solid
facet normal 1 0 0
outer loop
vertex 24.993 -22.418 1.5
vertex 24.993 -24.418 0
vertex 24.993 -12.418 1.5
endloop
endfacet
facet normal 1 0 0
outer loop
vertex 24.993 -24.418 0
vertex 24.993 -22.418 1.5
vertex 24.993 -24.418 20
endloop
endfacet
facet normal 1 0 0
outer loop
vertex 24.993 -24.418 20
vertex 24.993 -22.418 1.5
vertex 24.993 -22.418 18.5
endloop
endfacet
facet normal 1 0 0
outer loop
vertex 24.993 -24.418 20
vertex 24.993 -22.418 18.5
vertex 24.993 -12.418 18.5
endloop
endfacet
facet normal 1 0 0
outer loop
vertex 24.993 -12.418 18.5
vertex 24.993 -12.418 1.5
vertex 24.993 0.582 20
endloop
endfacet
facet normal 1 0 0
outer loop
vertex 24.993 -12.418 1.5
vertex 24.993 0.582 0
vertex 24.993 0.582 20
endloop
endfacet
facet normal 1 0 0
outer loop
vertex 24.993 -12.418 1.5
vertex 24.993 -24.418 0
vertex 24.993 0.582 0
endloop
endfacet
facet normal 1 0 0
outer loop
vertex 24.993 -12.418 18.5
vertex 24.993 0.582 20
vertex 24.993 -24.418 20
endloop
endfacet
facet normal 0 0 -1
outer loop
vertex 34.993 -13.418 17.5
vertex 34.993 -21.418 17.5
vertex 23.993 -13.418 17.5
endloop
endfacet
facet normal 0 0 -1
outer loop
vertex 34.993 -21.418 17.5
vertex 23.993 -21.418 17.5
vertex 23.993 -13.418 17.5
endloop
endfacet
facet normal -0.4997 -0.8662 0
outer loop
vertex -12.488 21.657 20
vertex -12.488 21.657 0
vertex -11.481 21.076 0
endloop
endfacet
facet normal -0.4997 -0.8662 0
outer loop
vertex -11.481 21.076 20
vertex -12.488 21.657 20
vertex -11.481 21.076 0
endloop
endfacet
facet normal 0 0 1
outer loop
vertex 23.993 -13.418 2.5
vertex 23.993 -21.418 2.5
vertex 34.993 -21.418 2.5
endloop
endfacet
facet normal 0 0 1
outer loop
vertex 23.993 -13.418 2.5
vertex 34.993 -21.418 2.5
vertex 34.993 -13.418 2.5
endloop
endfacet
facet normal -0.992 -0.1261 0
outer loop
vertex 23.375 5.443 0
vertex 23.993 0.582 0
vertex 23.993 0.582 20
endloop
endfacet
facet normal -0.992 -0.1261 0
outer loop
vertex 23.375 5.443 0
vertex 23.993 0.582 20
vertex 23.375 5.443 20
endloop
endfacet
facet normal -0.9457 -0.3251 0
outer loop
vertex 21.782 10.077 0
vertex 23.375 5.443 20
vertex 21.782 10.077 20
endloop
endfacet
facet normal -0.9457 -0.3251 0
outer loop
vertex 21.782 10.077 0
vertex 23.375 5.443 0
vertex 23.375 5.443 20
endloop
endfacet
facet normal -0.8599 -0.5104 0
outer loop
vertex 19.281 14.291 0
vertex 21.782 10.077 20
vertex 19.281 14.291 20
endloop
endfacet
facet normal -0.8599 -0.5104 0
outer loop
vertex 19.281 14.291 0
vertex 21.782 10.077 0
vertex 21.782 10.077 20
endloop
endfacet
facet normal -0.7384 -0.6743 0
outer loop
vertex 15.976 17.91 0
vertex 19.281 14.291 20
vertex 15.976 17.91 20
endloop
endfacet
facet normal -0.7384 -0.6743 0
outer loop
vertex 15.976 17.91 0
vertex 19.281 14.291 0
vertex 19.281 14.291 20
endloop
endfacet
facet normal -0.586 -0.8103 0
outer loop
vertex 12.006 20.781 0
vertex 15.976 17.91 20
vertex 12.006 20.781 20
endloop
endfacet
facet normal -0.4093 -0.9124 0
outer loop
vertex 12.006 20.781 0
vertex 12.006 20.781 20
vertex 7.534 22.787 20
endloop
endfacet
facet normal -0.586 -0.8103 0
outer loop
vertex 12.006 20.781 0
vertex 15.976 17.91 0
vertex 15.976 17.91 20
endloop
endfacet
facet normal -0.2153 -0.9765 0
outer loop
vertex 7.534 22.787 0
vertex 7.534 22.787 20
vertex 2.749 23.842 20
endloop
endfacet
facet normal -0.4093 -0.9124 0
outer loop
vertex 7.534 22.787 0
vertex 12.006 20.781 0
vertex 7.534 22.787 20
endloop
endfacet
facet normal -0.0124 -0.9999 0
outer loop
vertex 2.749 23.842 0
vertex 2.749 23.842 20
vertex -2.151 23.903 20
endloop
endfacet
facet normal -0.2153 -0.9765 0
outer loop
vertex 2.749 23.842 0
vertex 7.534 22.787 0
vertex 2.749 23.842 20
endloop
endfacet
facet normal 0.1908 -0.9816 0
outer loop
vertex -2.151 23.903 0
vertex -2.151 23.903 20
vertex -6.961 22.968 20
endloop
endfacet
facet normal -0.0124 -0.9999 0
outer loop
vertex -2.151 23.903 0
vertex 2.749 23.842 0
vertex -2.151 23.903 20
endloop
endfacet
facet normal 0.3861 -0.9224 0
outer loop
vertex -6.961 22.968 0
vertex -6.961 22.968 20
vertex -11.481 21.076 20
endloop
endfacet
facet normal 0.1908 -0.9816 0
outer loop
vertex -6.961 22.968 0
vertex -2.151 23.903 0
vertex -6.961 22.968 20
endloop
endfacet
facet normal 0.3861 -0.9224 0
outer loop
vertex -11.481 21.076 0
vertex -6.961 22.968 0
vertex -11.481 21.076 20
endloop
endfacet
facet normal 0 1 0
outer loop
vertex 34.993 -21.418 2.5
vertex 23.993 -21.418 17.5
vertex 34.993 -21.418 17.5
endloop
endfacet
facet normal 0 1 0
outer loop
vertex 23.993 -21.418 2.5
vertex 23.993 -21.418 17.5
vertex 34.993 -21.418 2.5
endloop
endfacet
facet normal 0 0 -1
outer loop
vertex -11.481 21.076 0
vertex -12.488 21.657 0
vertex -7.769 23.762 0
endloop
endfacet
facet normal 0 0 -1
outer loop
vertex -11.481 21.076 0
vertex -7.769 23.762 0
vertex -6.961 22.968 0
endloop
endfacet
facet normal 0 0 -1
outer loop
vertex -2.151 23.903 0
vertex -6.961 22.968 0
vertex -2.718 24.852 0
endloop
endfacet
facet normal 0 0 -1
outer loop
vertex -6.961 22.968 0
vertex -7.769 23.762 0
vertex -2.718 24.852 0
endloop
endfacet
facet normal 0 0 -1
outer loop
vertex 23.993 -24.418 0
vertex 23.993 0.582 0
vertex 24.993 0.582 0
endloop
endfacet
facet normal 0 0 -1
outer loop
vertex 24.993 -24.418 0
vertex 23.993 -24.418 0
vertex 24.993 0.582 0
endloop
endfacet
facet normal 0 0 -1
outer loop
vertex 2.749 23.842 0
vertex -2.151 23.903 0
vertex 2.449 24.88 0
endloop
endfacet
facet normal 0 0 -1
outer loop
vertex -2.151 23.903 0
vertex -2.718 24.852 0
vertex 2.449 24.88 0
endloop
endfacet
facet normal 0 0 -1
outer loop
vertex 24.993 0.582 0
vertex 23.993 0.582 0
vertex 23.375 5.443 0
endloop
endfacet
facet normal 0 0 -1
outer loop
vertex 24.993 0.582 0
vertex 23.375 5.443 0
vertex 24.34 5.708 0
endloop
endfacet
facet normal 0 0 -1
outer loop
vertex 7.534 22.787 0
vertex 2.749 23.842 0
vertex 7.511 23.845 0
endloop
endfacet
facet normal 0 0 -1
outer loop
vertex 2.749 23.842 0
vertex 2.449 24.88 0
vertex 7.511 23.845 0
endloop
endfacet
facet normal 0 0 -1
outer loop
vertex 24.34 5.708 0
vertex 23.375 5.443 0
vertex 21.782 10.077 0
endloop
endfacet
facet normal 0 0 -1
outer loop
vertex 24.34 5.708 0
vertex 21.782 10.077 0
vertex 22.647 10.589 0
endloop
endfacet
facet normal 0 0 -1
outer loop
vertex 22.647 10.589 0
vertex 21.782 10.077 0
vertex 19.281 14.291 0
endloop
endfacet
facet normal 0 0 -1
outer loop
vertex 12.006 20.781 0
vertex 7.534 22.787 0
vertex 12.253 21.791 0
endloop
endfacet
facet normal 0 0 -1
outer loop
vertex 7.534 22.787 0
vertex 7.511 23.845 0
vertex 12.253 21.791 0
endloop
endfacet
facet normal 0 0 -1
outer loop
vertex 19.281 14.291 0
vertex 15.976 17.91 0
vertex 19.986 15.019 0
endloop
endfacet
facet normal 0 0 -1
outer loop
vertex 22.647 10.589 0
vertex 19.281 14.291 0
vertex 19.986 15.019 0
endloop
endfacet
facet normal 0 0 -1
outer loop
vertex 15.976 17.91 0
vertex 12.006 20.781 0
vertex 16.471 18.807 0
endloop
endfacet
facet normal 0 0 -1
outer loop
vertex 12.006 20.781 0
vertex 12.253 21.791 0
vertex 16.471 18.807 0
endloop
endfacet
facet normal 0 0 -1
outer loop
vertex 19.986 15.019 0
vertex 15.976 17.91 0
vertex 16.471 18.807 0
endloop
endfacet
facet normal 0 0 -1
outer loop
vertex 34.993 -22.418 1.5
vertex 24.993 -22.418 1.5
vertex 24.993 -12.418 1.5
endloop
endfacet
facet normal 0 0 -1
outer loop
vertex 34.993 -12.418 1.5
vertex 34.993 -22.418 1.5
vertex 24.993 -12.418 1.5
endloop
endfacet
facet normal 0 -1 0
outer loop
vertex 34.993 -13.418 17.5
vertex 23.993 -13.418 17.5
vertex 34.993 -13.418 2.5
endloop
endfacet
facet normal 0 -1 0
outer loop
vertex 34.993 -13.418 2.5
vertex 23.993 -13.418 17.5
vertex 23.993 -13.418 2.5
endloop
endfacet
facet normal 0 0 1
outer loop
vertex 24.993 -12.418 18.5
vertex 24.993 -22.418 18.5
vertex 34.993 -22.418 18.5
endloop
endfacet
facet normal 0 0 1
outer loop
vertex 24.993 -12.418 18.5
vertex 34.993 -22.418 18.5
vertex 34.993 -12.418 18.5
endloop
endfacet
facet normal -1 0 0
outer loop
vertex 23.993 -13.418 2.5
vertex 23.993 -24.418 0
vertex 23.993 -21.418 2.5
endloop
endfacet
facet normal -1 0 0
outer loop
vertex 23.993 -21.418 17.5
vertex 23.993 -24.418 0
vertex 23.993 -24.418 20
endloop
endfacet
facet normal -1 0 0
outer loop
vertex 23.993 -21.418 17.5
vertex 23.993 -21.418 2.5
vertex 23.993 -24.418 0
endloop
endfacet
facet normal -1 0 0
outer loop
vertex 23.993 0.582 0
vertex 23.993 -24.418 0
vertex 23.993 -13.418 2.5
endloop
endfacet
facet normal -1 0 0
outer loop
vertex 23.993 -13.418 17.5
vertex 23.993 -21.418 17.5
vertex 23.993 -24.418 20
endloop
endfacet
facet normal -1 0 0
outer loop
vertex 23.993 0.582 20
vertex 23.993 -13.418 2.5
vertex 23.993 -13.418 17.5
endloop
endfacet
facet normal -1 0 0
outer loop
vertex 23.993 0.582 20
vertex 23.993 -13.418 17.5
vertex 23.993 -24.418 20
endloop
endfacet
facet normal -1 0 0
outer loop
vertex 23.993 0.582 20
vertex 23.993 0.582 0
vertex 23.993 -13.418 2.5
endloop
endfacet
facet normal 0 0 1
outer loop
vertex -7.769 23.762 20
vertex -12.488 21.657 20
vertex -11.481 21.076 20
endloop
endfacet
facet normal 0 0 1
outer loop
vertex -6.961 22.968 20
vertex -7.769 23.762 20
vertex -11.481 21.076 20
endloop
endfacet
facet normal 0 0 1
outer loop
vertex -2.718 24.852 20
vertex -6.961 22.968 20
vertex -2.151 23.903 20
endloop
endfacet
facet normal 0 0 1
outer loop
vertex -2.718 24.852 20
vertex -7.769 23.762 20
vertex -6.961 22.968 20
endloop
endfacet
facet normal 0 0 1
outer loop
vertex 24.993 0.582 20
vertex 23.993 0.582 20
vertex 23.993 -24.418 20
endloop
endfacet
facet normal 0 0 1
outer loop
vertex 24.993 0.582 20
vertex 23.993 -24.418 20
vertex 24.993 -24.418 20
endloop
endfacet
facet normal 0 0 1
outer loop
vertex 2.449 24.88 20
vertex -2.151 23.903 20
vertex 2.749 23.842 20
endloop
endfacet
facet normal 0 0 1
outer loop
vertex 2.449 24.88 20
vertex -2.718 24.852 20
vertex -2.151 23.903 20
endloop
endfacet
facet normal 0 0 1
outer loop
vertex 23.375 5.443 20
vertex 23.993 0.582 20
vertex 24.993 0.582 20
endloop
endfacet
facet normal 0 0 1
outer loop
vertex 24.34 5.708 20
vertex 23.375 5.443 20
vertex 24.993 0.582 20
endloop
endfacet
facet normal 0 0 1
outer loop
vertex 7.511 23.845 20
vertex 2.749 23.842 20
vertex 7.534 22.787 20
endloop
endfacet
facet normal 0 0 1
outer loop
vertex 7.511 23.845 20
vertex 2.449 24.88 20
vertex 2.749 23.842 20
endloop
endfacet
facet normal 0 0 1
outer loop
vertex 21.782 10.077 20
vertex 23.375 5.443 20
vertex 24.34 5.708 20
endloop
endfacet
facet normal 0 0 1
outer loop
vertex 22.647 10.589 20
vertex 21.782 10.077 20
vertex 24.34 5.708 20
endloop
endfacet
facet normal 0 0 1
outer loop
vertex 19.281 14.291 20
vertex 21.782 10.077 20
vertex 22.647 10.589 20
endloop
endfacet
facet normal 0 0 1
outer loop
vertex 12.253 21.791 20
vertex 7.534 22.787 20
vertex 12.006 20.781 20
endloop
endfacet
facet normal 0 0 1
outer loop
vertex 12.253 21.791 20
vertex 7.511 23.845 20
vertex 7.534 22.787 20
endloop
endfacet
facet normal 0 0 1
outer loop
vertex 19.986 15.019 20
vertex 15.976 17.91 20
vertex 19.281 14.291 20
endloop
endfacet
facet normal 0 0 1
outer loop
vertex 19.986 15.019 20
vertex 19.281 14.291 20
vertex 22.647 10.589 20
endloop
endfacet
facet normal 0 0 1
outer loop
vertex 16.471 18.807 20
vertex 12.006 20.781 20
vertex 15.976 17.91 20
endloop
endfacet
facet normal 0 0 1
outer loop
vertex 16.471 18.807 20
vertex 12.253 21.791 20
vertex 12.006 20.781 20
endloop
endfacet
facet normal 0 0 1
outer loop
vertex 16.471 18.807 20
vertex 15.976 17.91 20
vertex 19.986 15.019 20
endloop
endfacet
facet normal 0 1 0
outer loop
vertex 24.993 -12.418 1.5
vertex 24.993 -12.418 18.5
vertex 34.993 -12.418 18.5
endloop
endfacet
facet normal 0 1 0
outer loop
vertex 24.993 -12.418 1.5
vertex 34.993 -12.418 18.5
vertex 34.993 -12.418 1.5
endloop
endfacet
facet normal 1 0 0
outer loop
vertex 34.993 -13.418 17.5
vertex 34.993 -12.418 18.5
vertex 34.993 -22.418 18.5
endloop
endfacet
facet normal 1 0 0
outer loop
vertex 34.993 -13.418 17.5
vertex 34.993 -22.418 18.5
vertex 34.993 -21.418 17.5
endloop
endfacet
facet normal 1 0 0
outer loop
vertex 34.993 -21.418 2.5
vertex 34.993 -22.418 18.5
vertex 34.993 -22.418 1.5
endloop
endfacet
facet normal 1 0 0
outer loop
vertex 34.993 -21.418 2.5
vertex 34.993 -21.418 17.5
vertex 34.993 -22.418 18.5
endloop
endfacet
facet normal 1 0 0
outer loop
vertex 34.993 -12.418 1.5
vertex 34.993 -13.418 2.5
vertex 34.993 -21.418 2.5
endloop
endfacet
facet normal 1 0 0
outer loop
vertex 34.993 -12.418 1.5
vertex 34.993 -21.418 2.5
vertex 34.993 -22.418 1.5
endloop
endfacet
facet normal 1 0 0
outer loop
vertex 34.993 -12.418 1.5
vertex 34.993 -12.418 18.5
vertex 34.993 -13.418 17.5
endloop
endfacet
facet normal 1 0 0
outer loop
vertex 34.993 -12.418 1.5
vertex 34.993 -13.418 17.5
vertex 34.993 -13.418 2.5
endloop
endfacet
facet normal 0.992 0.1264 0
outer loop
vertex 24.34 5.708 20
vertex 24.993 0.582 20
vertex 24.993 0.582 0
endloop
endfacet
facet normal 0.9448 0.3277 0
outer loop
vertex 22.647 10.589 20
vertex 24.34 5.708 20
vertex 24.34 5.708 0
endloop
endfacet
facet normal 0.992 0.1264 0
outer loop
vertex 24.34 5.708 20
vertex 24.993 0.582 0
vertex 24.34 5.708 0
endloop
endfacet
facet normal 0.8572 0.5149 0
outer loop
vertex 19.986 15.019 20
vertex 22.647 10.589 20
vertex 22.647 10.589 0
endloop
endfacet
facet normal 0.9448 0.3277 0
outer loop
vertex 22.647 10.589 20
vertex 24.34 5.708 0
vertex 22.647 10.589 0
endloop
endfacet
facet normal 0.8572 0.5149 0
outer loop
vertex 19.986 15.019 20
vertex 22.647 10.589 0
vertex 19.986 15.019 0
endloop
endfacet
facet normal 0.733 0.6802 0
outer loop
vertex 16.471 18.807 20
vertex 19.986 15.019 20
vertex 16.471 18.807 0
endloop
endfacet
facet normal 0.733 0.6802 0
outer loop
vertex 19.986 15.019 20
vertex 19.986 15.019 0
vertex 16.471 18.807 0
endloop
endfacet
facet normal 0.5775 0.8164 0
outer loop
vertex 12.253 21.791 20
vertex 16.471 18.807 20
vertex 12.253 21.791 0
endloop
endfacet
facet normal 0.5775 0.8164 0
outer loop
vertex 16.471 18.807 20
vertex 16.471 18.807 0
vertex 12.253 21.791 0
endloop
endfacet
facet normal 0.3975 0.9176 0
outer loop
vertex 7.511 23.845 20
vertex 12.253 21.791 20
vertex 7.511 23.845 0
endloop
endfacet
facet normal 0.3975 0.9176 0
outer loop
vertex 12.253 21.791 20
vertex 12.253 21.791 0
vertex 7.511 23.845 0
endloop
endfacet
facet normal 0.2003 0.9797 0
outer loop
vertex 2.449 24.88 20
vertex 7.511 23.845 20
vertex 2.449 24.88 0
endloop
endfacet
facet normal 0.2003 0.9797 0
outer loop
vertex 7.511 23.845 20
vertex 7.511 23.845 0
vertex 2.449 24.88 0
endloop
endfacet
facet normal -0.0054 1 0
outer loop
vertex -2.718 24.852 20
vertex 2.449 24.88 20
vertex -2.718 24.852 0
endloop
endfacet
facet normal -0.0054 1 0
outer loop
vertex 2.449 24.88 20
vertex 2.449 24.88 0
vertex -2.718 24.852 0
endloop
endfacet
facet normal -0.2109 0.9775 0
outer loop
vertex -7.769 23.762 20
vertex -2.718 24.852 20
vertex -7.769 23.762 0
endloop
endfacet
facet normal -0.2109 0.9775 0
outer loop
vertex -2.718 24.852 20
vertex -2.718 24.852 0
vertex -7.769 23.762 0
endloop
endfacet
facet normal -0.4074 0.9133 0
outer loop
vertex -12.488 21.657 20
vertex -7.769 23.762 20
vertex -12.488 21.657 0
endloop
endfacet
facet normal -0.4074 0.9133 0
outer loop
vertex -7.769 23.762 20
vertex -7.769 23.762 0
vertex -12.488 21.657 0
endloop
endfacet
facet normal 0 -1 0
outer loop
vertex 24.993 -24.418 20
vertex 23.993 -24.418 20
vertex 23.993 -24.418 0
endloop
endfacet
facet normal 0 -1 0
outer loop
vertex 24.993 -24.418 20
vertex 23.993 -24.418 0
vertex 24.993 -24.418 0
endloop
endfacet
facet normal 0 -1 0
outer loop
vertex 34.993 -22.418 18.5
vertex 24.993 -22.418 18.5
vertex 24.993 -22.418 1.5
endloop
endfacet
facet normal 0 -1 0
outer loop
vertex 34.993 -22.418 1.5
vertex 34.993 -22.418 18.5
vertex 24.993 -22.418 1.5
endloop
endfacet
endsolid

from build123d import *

# Parameters (mm, degrees)
SKETCH2_R           = 25
SKETCH2_R_2         = 24
BOSS_EXTRUDE1_DEPTH = 20
CUT_EXTRUDE1_DEPTH  = 21
SKETCH4_W           = 1.280900959
SKETCH4_H           = 0.727497166
CUT_EXTRUDE2_DEPTH  = 21
SKETCH5_W           = 1.000282178
SKETCH5_H           = 20
BOSS_EXTRUDE2_DEPTH = 25
SKETCH6_W           = 15
SKETCH6_H           = 8
CUT_EXTRUDE3_DEPTH  = 38.481628733
SKETCH7_W           = 17
SKETCH7_H           = 10
SKETCH7_W_2         = 15
SKETCH7_H_2         = 8
BOSS_EXTRUDE3_DEPTH = 10


with BuildPart() as part:
    # Sketch2 → Boss-Extrude1 (new body)
    with BuildSketch(Plane.XY):
        Circle(SKETCH2_R)
        Circle(SKETCH2_R_2, mode=Mode.SUBTRACT)
    extrude(amount=BOSS_EXTRUDE1_DEPTH)

    # Sketch3 → Cut-Extrude1 (cut, through all)
    with BuildSketch(Plane.XY.offset(20)):
        Polygon((-12.48839905, 21.657328764), (25, 0), (47.90060784, -51.20755357), (-94.197848054, -17.737254368), align=None)
    extrude(amount=-CUT_EXTRUDE1_DEPTH, mode=Mode.SUBTRACT)

    # Sketch4 → Cut-Extrude2 (cut, through all)
    with BuildSketch(Plane.XY.offset(20)):
        with Locations((24.633397985, 0.218033182)):
            Rectangle(SKETCH4_W, SKETCH4_H)
    extrude(amount=-CUT_EXTRUDE2_DEPTH, mode=Mode.SUBTRACT)

    # Sketch5 → Boss-Extrude2 (add)
    with BuildSketch(Plane.XZ.offset(-0.581781765)):
        with Locations((24.493088594, 10)):
            Rectangle(SKETCH5_W, SKETCH5_H)
    extrude(amount=BOSS_EXTRUDE2_DEPTH)

    # Sketch6 → Cut-Extrude3 (cut, through all)
    with BuildSketch(Plane(origin=(24.993229683, 0, 0), x_dir=(0, 0, -1), z_dir=(1, 0, 0))):
        with Locations((-10, -17.418218235)):
            Rectangle(SKETCH6_W, SKETCH6_H)
    extrude(amount=-CUT_EXTRUDE3_DEPTH, mode=Mode.SUBTRACT)

    # Sketch7 → Boss-Extrude3 (add)
    with BuildSketch(Plane(origin=(24.993229683, 0, 0), x_dir=(0, 0, -1), z_dir=(1, 0, 0))):
        with Locations((-10, -17.418218235)):
            Rectangle(SKETCH7_W, SKETCH7_H)
        with Locations((-10, -17.418218235)):
            Rectangle(SKETCH7_W_2, SKETCH7_H_2, mode=Mode.SUBTRACT)
    extrude(amount=BOSS_EXTRUDE3_DEPTH)


solid = part.part
